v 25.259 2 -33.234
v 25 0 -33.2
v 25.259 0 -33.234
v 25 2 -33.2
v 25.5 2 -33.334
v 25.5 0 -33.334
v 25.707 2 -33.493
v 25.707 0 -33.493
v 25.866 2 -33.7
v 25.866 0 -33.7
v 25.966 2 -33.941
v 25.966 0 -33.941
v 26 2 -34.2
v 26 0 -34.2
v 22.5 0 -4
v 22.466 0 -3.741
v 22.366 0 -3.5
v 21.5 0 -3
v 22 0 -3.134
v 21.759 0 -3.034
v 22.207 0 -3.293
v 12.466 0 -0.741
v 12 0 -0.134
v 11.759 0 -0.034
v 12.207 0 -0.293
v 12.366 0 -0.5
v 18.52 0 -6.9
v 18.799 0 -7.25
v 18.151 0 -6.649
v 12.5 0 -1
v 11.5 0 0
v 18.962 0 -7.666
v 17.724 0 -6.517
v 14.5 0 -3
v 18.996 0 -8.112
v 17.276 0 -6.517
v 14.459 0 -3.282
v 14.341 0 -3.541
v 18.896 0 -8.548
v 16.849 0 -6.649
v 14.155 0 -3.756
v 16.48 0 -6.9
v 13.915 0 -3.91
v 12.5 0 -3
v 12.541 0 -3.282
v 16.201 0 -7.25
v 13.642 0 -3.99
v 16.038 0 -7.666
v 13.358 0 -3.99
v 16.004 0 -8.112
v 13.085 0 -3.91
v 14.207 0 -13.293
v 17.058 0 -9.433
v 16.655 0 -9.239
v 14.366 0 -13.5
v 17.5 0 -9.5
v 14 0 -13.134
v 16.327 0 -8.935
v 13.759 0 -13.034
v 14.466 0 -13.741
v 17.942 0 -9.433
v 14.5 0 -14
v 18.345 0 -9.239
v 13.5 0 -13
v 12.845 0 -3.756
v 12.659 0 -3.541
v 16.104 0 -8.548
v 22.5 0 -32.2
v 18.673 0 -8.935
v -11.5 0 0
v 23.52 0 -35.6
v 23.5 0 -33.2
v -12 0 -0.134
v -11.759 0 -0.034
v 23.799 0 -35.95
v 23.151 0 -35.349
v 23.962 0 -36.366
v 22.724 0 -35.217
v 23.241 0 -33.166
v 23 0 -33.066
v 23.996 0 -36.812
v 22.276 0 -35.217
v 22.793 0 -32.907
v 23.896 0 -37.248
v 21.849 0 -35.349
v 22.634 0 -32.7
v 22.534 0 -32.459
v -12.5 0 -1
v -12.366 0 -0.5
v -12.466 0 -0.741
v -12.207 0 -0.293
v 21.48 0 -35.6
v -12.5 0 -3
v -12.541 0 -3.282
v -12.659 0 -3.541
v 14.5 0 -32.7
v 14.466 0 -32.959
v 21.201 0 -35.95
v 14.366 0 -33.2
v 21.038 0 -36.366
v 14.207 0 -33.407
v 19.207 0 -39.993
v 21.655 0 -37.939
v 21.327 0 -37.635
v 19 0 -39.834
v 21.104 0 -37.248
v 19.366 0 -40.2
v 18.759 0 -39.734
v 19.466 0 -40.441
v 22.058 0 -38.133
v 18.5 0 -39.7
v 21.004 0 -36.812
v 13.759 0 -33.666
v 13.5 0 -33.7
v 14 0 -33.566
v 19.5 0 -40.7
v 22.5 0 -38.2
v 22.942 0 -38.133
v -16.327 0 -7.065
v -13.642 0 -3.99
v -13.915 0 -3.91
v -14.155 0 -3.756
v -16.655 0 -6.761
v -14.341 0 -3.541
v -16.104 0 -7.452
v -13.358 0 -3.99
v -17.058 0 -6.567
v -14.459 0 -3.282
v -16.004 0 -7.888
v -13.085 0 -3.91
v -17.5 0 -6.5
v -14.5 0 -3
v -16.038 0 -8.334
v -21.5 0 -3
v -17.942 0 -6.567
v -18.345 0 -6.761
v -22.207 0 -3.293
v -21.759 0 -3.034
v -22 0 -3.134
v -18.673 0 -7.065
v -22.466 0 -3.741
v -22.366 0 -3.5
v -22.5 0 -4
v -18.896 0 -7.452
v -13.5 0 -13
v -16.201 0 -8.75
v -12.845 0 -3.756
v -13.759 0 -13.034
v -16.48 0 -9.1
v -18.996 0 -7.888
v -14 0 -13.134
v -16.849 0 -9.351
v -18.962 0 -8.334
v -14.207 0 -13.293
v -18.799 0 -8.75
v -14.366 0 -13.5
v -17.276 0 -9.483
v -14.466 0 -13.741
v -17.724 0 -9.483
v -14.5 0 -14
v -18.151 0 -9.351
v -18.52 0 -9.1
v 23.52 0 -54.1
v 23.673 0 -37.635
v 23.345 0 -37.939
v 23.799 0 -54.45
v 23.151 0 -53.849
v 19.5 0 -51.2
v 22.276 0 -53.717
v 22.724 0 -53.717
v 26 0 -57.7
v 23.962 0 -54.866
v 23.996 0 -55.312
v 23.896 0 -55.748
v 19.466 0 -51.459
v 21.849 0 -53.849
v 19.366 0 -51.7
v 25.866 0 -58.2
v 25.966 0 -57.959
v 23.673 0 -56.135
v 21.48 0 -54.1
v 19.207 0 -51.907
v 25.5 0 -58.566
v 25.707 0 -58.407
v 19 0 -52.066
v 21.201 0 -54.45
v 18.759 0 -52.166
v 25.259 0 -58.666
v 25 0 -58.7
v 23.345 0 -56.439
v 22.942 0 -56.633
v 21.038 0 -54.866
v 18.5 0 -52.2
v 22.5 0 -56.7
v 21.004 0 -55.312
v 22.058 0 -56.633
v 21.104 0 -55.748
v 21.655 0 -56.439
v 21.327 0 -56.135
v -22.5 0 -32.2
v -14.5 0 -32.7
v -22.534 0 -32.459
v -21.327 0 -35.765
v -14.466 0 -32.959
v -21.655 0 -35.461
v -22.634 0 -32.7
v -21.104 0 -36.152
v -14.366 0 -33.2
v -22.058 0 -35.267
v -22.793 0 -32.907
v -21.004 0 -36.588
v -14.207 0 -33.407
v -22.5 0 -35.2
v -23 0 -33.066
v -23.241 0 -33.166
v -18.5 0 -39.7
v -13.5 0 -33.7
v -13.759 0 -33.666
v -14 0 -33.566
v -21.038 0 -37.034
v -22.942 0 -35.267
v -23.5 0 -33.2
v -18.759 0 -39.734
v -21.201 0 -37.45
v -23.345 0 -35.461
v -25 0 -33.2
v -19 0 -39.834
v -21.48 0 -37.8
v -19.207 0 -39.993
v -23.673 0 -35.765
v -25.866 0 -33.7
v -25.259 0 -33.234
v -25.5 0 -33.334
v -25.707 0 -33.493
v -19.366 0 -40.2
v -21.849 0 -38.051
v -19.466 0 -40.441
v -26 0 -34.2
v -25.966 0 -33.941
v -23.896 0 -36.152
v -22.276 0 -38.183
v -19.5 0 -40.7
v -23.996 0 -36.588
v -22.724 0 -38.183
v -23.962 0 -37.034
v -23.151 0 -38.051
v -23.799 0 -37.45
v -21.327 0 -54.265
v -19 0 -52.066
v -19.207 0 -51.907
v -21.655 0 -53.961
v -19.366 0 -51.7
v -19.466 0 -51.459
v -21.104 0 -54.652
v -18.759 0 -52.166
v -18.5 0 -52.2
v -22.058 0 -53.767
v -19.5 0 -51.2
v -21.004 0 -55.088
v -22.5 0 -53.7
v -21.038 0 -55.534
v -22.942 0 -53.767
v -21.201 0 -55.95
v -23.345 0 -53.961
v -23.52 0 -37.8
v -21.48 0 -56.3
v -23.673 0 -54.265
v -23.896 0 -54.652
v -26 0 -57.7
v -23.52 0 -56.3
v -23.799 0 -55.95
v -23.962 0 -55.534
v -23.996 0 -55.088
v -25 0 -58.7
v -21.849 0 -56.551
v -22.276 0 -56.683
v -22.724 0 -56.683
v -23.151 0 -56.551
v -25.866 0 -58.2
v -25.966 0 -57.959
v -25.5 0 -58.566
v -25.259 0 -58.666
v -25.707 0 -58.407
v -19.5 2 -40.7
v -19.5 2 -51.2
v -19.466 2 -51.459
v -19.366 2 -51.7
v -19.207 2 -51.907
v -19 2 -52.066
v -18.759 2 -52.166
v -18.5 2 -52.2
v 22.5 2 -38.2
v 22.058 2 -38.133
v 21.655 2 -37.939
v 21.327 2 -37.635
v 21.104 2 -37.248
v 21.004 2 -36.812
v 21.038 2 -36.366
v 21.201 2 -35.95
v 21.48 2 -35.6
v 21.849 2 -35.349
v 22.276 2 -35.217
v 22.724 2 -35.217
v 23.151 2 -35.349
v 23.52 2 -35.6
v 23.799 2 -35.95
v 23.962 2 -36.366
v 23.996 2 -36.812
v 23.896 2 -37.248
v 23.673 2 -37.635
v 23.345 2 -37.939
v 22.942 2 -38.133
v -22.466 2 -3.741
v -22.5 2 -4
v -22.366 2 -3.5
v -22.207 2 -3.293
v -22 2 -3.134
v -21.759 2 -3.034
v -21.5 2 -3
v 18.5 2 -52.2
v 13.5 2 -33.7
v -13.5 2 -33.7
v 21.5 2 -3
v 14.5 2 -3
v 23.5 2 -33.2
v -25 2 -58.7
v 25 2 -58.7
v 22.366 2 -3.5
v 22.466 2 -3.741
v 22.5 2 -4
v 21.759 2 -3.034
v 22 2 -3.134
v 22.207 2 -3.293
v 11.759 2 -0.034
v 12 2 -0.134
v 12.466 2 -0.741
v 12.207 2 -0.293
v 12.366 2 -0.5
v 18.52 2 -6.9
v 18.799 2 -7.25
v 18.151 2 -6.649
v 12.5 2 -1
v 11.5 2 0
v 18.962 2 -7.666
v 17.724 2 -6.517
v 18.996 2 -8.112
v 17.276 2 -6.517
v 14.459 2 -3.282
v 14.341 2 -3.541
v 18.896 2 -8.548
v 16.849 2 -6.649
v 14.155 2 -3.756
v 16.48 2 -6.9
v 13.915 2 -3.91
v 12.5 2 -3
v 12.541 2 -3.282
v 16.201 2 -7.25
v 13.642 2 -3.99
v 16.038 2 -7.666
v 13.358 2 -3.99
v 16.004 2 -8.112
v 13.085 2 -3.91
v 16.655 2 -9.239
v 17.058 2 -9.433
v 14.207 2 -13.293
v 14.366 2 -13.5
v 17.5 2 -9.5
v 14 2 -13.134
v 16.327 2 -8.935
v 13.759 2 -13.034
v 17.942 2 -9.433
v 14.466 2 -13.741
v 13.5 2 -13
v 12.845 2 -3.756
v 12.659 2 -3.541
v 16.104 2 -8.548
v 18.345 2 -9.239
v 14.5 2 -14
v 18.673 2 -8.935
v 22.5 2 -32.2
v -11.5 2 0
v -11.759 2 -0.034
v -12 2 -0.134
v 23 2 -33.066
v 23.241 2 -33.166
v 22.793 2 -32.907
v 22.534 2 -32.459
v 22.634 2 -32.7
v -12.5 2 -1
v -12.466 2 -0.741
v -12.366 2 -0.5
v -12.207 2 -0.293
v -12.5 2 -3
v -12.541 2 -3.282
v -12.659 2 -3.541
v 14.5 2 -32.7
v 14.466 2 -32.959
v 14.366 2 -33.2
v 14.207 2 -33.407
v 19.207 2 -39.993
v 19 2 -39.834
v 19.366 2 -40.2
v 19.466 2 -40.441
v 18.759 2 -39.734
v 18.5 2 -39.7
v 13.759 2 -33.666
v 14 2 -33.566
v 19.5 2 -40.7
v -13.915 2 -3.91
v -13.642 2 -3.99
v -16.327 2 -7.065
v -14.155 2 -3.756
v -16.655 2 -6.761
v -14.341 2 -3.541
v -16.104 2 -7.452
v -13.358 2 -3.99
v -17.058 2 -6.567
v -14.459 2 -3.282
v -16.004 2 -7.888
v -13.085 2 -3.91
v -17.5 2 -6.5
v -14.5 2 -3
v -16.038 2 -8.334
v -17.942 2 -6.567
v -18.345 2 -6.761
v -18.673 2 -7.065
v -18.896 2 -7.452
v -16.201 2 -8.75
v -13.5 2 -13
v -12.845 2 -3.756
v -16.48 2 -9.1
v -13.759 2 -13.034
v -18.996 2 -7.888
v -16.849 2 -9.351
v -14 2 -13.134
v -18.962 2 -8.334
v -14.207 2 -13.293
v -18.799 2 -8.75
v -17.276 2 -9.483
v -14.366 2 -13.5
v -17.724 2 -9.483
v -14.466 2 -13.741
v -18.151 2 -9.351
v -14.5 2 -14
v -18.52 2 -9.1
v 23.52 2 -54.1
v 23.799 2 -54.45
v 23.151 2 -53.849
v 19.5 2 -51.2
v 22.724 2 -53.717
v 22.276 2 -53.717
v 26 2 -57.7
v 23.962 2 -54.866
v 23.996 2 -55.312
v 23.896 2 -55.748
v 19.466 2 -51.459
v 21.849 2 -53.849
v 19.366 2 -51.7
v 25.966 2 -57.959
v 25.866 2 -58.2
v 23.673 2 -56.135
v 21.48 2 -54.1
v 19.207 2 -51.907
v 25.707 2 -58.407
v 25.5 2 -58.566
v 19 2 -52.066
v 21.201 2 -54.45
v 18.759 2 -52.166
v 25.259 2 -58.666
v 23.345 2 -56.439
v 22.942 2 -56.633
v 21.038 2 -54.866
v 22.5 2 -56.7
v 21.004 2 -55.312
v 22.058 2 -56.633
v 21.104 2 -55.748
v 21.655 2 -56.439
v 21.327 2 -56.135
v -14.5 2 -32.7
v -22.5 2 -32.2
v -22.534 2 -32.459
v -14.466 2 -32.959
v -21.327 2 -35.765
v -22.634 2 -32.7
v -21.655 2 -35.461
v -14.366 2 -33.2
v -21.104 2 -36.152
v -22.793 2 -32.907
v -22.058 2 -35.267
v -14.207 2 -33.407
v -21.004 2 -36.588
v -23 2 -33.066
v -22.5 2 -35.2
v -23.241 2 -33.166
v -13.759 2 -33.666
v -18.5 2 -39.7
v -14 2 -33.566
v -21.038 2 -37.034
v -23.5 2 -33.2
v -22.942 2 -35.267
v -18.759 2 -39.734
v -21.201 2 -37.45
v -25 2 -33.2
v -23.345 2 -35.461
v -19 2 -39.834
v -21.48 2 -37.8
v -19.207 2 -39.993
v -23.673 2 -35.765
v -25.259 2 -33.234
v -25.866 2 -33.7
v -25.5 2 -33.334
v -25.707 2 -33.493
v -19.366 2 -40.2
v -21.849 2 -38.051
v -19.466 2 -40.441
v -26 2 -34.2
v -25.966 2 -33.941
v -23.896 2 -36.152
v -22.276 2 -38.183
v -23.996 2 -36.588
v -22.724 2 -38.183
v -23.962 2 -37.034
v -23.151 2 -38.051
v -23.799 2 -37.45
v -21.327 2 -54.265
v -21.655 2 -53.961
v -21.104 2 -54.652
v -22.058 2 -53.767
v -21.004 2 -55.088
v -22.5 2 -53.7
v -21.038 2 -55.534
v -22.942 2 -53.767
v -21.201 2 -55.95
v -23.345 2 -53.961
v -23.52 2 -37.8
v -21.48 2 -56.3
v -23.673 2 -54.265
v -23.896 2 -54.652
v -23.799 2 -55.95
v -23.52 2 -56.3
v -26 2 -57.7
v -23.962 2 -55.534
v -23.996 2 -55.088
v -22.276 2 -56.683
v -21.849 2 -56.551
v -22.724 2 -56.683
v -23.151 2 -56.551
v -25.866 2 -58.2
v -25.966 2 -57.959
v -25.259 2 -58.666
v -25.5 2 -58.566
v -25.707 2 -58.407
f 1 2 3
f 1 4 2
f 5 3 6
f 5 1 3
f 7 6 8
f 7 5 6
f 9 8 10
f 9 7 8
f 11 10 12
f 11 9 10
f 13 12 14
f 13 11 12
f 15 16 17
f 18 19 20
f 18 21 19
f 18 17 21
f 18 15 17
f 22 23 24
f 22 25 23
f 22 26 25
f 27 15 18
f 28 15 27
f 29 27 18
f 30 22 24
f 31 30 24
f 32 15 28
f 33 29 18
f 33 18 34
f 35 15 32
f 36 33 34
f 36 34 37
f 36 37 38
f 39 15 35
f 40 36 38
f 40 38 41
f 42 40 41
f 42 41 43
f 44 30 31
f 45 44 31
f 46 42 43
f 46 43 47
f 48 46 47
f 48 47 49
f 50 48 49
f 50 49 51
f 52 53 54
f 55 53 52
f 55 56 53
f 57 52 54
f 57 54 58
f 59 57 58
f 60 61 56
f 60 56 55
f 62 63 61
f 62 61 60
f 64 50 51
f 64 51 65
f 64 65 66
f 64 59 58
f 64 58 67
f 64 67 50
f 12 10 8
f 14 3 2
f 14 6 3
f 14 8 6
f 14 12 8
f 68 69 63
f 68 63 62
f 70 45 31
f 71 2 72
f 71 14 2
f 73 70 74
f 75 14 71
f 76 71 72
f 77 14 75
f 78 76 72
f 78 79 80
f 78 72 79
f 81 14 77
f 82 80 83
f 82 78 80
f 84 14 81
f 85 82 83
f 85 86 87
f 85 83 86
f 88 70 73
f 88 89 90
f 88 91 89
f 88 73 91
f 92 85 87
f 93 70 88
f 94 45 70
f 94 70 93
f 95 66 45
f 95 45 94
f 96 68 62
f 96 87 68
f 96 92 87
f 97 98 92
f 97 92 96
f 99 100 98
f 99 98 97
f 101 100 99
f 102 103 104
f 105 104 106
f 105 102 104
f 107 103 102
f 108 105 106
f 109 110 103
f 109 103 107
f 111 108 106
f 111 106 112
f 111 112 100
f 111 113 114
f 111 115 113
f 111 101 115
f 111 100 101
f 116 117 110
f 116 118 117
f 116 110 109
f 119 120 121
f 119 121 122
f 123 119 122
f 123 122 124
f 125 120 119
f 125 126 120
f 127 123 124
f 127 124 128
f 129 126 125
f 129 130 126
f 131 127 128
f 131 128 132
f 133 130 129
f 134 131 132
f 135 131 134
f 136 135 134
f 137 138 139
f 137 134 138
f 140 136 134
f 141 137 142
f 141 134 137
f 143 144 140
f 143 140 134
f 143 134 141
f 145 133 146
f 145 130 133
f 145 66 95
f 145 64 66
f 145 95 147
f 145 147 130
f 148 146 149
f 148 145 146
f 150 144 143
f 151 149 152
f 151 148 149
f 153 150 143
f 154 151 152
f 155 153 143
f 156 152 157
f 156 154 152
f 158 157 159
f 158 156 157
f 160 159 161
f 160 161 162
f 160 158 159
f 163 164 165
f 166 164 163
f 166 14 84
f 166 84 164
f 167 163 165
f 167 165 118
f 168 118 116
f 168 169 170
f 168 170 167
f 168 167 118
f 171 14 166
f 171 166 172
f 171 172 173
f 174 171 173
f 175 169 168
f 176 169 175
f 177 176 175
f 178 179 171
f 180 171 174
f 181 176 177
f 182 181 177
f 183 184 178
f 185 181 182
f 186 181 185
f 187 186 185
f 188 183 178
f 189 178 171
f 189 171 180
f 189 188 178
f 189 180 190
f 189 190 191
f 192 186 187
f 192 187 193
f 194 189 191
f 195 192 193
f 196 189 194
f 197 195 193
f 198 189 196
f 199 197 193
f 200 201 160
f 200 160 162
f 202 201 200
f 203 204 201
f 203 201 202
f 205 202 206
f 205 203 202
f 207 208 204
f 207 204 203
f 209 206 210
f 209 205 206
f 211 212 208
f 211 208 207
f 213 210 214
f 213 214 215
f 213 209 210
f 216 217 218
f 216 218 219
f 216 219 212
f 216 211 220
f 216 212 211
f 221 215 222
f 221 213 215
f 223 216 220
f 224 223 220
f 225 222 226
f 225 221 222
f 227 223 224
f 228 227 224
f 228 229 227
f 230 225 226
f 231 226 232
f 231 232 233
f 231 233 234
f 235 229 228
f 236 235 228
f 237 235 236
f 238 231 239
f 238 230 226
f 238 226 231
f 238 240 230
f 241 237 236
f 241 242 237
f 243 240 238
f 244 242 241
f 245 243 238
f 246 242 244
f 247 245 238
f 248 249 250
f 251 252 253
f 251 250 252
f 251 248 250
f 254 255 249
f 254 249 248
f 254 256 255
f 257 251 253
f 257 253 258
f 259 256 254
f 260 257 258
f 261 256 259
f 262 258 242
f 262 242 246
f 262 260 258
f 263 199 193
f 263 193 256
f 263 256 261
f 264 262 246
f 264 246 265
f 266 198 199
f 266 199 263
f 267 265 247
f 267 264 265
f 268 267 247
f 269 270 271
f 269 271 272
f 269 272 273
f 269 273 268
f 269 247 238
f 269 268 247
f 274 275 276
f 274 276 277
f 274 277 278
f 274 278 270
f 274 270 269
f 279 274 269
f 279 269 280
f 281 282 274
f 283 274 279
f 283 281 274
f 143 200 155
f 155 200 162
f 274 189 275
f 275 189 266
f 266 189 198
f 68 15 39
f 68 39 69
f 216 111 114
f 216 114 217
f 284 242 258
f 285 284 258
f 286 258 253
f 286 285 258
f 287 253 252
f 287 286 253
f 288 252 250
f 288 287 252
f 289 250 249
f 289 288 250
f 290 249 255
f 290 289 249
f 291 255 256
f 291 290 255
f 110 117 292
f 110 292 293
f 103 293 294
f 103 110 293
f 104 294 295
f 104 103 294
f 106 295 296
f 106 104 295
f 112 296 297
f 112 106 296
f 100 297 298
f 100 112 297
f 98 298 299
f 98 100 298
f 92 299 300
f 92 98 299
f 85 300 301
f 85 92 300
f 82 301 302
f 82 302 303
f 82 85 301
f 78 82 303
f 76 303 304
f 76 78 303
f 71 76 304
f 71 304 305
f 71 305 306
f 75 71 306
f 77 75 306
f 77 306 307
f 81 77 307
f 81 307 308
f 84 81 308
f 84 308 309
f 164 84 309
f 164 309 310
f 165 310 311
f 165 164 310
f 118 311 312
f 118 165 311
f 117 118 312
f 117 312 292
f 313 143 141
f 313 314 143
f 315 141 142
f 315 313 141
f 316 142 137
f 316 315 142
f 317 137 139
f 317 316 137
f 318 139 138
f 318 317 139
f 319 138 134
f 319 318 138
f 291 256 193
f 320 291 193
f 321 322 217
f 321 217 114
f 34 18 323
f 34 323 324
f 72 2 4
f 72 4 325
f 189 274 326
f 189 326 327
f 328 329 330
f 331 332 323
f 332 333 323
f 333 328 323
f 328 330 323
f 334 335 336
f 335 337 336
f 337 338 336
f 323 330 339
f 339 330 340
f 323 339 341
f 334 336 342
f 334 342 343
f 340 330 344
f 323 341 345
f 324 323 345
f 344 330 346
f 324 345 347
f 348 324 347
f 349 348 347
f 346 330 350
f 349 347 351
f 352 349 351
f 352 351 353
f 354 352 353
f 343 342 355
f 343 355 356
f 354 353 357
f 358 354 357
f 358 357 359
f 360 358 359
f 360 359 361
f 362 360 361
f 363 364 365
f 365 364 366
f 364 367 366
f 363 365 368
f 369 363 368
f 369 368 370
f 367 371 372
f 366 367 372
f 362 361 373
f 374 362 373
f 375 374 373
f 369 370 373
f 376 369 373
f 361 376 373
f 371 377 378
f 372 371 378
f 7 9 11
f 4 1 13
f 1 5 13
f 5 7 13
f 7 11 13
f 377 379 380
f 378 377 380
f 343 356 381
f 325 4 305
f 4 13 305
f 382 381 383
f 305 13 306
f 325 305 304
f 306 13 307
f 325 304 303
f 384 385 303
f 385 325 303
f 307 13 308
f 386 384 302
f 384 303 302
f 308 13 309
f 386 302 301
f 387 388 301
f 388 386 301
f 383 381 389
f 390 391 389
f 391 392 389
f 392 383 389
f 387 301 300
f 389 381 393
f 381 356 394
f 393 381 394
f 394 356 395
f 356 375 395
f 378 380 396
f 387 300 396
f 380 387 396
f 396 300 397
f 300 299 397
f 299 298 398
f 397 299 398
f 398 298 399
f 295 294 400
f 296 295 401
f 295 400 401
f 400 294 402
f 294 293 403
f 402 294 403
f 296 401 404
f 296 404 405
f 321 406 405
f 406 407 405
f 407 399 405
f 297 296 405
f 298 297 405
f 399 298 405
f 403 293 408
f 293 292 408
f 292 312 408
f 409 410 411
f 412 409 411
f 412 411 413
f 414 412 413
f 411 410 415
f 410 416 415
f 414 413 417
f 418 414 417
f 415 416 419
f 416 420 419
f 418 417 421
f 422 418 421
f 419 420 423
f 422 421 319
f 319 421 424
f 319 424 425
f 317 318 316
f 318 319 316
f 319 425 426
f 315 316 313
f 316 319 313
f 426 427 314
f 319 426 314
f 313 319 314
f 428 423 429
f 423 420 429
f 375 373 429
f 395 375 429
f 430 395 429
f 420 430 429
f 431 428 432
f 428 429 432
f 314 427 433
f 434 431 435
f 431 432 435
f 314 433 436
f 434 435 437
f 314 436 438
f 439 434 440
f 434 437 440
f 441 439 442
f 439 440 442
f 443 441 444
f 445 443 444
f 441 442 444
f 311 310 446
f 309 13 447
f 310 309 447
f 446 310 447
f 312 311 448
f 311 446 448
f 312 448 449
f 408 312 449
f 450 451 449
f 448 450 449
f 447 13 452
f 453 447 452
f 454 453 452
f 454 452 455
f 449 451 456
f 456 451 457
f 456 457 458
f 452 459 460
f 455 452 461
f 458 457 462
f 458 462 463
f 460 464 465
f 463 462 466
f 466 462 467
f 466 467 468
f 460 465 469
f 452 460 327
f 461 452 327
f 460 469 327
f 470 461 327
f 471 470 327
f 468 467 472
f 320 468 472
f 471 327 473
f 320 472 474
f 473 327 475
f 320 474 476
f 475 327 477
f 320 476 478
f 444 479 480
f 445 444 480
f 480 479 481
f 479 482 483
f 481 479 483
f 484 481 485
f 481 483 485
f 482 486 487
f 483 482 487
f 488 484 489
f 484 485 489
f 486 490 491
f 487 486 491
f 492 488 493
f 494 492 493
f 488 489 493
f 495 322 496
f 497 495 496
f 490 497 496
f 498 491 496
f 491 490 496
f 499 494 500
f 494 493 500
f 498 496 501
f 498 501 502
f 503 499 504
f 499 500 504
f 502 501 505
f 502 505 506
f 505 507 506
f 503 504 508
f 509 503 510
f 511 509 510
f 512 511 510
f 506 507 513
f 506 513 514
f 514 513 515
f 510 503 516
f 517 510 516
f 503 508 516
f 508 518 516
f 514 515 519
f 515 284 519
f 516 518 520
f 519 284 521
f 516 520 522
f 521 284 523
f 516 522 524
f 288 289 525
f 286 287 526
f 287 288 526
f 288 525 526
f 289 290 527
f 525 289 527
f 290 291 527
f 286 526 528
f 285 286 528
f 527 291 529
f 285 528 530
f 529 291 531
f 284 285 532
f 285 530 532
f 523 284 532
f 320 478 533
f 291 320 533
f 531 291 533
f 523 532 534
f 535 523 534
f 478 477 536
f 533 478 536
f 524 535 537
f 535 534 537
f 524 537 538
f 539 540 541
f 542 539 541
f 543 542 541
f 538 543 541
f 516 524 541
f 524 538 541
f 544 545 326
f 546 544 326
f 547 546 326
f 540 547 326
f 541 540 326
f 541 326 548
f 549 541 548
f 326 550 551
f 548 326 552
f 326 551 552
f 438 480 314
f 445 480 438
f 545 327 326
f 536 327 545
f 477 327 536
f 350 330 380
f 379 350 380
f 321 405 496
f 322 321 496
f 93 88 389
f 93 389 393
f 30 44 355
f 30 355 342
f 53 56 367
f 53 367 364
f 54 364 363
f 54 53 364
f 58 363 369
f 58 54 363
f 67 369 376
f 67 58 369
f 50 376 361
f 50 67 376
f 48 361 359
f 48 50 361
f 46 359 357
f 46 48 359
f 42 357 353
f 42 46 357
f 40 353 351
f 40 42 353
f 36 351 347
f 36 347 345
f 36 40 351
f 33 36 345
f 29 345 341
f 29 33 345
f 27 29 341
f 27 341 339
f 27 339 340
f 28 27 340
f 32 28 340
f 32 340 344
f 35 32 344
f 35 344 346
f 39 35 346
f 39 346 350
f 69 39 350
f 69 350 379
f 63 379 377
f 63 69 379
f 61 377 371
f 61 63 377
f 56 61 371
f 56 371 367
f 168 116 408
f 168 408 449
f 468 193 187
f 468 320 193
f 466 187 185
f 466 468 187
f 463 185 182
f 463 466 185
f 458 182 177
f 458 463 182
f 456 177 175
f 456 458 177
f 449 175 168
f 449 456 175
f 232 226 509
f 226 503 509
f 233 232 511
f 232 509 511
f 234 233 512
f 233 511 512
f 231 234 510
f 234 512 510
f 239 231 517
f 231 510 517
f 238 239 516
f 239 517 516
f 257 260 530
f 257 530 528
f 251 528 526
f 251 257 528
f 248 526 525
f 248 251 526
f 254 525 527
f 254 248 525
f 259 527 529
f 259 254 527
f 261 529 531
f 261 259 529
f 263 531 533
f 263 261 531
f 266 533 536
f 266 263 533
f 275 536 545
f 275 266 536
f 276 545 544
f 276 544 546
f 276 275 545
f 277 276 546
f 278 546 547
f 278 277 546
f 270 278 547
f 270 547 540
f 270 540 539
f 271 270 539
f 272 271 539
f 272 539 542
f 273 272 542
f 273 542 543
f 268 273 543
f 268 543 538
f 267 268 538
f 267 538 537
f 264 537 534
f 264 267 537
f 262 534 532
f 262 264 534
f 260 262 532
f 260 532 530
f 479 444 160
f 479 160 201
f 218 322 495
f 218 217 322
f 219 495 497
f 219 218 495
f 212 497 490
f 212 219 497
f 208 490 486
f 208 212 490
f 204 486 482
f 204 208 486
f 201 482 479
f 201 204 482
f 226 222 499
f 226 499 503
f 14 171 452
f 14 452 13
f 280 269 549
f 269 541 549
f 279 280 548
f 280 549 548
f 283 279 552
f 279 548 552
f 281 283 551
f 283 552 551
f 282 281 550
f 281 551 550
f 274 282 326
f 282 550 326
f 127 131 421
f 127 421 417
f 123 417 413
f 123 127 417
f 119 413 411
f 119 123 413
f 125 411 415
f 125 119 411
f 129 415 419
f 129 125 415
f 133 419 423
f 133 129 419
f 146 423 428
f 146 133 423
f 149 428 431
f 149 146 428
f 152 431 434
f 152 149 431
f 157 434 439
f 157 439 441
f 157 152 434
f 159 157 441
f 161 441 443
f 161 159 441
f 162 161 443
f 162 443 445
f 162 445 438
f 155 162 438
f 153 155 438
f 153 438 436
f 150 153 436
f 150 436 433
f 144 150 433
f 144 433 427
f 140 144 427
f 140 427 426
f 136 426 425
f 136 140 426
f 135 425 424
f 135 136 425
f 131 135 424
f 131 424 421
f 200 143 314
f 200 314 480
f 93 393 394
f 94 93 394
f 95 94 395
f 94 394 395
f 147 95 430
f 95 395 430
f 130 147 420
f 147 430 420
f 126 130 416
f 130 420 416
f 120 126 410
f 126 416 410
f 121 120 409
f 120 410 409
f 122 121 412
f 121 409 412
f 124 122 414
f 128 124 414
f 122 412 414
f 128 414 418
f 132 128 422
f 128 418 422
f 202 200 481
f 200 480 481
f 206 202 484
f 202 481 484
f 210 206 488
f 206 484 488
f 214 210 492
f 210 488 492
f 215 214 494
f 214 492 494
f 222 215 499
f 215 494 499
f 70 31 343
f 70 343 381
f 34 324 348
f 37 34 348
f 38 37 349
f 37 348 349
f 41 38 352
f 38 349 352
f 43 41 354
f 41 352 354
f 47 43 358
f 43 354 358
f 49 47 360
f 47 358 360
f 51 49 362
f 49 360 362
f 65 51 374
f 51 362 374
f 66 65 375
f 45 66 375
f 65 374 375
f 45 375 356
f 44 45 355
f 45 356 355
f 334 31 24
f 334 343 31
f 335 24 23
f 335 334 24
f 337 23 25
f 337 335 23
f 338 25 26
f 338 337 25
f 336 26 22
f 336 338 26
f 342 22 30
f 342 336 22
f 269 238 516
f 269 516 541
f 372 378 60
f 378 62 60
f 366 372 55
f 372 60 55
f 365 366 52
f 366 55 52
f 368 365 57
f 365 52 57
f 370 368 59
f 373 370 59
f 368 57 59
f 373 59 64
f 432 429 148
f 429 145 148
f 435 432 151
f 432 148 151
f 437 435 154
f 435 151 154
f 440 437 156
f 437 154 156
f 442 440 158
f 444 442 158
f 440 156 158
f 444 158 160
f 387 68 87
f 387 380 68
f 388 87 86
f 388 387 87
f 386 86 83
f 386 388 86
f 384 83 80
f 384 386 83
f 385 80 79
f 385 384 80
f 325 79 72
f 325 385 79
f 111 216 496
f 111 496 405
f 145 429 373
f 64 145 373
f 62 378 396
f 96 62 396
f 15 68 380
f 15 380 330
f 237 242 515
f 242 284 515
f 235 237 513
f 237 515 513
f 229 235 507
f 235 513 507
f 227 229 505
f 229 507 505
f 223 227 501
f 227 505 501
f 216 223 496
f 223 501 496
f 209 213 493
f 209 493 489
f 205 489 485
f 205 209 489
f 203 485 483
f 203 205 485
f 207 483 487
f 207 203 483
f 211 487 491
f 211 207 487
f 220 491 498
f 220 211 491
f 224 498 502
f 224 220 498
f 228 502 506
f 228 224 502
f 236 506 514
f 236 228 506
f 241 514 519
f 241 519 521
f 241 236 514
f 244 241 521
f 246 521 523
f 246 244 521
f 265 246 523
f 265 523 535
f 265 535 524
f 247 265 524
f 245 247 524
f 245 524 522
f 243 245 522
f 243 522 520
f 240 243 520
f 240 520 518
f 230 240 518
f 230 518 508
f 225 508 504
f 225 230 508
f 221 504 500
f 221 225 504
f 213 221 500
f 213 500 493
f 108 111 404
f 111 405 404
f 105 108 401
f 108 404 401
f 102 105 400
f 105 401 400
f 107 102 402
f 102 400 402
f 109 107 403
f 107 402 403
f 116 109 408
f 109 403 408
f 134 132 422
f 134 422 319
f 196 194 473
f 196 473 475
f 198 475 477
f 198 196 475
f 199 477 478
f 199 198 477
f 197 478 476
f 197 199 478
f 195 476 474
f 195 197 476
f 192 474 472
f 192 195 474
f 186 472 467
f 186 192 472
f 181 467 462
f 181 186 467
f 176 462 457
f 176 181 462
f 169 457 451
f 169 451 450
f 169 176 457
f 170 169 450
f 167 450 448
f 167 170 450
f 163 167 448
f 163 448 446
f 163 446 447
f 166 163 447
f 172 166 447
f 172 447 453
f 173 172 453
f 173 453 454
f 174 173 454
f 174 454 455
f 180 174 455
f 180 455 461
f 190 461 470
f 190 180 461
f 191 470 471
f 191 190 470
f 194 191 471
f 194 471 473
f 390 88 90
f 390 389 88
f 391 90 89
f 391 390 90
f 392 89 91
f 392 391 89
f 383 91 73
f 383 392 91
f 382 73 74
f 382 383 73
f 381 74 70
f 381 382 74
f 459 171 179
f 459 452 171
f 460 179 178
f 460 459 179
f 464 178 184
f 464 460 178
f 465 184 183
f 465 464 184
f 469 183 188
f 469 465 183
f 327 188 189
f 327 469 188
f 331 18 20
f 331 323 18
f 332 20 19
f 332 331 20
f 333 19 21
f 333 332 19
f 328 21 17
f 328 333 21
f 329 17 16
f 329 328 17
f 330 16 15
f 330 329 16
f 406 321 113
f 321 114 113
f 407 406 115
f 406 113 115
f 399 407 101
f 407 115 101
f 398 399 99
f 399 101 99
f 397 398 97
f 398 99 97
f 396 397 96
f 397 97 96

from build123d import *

# Parameters (mm, degrees)
SKETCH_1_R          = 1.5
SKETCH_1_W          = 39
SKETCH_1_H          = 12.5
EXTRUDE_1_DEPTH     = 2
SKETCH_2_R          = 1
SKETCH_2_W          = 29
SKETCH_2_H          = 20.7
CUT_EXTRUDE_1_DEPTH = 65.231534311
FILLET_1_R          = 1


with BuildPart() as part:
    # 草图1 → 凸台-拉伸1 (new body)
    with BuildSketch(Plane(origin=(0, 0, 0), x_dir=(1, 0, 0), z_dir=(0, 1, 0))):
        Polygon((-22.5, 3), (-22.5, 33.2), (-26, 33.2), (-26, 58.7), (26, 58.7), (26, 33.2), (22.5, 33.2), (22.5, 3), (12.5, 3), (12.5, 0), (-12.5, 0), (-12.5, 3), align=None)
        with Locations(Location((-22.5, 55.2, 0), (0, 0, 270))):
            Circle(SKETCH_1_R, mode=Mode.SUBTRACT)
        with Locations(Location((-22.5, 36.7, 0), (0, 0, 270))):
            Circle(SKETCH_1_R, mode=Mode.SUBTRACT)
        with Locations(Location((22.5, 36.7, 0), (0, 0, 90))):
            Circle(SKETCH_1_R, mode=Mode.SUBTRACT)
        with Locations(Location((22.5, 55.2, 0), (0, 0, 90))):
            Circle(SKETCH_1_R, mode=Mode.SUBTRACT)
        with Locations(Location((-17.5, 8, 0), (0, 0, 270))):
            Circle(SKETCH_1_R, mode=Mode.SUBTRACT)
        with Locations(Location((17.5, 8, 0), (0, 0, 90))):
            Circle(SKETCH_1_R, mode=Mode.SUBTRACT)
        with Locations((0, 45.95)):
            Rectangle(SKETCH_1_W, SKETCH_1_H, mode=Mode.SUBTRACT)
    extrude(amount=EXTRUDE_1_DEPTH)

    # 草图2 → 切除-拉伸1 (cut, through all)
    with BuildSketch(Plane(origin=(0, 2, 0), x_dir=(1, 0, 0), z_dir=(0, 1, 0))):
        with Locations((-13.5, 3)):
            Circle(SKETCH_2_R)
        with Locations((13.5, 3)):
            Circle(SKETCH_2_R)
        with Locations((0, 23.35)):
            Rectangle(SKETCH_2_W, SKETCH_2_H)
    extrude(amount=-CUT_EXTRUDE_1_DEPTH, mode=Mode.SUBTRACT)

    # 圆角1
    fillet_1_edges = [part.edges().sort_by_distance(p)[0] for p in [
        (26, 1, -33.2),
        (22.5, 1, -33.2),
        (22.5, 1, -3),
        (12.5, 1, 0),
        (-12.5, 1, 0),
        (-22.5, 1, -3),
        (-22.5, 1, -33.2),
        (-26, 1, -33.2),
        (-26, 1, -58.7),
        (26, 1, -58.7),
        (-19.5, 1, -52.2),
        (-19.5, 1, -39.7),
        (19.5, 1, -39.7),
        (19.5, 1, -52.2),
        (-14.5, 1, -13),
        (-14.5, 1, -33.7),
        (14.5, 1, -33.7),
        (14.5, 1, -13),
    ]]
    fillet(fillet_1_edges, radius=FILLET_1_R)


solid = part.part
